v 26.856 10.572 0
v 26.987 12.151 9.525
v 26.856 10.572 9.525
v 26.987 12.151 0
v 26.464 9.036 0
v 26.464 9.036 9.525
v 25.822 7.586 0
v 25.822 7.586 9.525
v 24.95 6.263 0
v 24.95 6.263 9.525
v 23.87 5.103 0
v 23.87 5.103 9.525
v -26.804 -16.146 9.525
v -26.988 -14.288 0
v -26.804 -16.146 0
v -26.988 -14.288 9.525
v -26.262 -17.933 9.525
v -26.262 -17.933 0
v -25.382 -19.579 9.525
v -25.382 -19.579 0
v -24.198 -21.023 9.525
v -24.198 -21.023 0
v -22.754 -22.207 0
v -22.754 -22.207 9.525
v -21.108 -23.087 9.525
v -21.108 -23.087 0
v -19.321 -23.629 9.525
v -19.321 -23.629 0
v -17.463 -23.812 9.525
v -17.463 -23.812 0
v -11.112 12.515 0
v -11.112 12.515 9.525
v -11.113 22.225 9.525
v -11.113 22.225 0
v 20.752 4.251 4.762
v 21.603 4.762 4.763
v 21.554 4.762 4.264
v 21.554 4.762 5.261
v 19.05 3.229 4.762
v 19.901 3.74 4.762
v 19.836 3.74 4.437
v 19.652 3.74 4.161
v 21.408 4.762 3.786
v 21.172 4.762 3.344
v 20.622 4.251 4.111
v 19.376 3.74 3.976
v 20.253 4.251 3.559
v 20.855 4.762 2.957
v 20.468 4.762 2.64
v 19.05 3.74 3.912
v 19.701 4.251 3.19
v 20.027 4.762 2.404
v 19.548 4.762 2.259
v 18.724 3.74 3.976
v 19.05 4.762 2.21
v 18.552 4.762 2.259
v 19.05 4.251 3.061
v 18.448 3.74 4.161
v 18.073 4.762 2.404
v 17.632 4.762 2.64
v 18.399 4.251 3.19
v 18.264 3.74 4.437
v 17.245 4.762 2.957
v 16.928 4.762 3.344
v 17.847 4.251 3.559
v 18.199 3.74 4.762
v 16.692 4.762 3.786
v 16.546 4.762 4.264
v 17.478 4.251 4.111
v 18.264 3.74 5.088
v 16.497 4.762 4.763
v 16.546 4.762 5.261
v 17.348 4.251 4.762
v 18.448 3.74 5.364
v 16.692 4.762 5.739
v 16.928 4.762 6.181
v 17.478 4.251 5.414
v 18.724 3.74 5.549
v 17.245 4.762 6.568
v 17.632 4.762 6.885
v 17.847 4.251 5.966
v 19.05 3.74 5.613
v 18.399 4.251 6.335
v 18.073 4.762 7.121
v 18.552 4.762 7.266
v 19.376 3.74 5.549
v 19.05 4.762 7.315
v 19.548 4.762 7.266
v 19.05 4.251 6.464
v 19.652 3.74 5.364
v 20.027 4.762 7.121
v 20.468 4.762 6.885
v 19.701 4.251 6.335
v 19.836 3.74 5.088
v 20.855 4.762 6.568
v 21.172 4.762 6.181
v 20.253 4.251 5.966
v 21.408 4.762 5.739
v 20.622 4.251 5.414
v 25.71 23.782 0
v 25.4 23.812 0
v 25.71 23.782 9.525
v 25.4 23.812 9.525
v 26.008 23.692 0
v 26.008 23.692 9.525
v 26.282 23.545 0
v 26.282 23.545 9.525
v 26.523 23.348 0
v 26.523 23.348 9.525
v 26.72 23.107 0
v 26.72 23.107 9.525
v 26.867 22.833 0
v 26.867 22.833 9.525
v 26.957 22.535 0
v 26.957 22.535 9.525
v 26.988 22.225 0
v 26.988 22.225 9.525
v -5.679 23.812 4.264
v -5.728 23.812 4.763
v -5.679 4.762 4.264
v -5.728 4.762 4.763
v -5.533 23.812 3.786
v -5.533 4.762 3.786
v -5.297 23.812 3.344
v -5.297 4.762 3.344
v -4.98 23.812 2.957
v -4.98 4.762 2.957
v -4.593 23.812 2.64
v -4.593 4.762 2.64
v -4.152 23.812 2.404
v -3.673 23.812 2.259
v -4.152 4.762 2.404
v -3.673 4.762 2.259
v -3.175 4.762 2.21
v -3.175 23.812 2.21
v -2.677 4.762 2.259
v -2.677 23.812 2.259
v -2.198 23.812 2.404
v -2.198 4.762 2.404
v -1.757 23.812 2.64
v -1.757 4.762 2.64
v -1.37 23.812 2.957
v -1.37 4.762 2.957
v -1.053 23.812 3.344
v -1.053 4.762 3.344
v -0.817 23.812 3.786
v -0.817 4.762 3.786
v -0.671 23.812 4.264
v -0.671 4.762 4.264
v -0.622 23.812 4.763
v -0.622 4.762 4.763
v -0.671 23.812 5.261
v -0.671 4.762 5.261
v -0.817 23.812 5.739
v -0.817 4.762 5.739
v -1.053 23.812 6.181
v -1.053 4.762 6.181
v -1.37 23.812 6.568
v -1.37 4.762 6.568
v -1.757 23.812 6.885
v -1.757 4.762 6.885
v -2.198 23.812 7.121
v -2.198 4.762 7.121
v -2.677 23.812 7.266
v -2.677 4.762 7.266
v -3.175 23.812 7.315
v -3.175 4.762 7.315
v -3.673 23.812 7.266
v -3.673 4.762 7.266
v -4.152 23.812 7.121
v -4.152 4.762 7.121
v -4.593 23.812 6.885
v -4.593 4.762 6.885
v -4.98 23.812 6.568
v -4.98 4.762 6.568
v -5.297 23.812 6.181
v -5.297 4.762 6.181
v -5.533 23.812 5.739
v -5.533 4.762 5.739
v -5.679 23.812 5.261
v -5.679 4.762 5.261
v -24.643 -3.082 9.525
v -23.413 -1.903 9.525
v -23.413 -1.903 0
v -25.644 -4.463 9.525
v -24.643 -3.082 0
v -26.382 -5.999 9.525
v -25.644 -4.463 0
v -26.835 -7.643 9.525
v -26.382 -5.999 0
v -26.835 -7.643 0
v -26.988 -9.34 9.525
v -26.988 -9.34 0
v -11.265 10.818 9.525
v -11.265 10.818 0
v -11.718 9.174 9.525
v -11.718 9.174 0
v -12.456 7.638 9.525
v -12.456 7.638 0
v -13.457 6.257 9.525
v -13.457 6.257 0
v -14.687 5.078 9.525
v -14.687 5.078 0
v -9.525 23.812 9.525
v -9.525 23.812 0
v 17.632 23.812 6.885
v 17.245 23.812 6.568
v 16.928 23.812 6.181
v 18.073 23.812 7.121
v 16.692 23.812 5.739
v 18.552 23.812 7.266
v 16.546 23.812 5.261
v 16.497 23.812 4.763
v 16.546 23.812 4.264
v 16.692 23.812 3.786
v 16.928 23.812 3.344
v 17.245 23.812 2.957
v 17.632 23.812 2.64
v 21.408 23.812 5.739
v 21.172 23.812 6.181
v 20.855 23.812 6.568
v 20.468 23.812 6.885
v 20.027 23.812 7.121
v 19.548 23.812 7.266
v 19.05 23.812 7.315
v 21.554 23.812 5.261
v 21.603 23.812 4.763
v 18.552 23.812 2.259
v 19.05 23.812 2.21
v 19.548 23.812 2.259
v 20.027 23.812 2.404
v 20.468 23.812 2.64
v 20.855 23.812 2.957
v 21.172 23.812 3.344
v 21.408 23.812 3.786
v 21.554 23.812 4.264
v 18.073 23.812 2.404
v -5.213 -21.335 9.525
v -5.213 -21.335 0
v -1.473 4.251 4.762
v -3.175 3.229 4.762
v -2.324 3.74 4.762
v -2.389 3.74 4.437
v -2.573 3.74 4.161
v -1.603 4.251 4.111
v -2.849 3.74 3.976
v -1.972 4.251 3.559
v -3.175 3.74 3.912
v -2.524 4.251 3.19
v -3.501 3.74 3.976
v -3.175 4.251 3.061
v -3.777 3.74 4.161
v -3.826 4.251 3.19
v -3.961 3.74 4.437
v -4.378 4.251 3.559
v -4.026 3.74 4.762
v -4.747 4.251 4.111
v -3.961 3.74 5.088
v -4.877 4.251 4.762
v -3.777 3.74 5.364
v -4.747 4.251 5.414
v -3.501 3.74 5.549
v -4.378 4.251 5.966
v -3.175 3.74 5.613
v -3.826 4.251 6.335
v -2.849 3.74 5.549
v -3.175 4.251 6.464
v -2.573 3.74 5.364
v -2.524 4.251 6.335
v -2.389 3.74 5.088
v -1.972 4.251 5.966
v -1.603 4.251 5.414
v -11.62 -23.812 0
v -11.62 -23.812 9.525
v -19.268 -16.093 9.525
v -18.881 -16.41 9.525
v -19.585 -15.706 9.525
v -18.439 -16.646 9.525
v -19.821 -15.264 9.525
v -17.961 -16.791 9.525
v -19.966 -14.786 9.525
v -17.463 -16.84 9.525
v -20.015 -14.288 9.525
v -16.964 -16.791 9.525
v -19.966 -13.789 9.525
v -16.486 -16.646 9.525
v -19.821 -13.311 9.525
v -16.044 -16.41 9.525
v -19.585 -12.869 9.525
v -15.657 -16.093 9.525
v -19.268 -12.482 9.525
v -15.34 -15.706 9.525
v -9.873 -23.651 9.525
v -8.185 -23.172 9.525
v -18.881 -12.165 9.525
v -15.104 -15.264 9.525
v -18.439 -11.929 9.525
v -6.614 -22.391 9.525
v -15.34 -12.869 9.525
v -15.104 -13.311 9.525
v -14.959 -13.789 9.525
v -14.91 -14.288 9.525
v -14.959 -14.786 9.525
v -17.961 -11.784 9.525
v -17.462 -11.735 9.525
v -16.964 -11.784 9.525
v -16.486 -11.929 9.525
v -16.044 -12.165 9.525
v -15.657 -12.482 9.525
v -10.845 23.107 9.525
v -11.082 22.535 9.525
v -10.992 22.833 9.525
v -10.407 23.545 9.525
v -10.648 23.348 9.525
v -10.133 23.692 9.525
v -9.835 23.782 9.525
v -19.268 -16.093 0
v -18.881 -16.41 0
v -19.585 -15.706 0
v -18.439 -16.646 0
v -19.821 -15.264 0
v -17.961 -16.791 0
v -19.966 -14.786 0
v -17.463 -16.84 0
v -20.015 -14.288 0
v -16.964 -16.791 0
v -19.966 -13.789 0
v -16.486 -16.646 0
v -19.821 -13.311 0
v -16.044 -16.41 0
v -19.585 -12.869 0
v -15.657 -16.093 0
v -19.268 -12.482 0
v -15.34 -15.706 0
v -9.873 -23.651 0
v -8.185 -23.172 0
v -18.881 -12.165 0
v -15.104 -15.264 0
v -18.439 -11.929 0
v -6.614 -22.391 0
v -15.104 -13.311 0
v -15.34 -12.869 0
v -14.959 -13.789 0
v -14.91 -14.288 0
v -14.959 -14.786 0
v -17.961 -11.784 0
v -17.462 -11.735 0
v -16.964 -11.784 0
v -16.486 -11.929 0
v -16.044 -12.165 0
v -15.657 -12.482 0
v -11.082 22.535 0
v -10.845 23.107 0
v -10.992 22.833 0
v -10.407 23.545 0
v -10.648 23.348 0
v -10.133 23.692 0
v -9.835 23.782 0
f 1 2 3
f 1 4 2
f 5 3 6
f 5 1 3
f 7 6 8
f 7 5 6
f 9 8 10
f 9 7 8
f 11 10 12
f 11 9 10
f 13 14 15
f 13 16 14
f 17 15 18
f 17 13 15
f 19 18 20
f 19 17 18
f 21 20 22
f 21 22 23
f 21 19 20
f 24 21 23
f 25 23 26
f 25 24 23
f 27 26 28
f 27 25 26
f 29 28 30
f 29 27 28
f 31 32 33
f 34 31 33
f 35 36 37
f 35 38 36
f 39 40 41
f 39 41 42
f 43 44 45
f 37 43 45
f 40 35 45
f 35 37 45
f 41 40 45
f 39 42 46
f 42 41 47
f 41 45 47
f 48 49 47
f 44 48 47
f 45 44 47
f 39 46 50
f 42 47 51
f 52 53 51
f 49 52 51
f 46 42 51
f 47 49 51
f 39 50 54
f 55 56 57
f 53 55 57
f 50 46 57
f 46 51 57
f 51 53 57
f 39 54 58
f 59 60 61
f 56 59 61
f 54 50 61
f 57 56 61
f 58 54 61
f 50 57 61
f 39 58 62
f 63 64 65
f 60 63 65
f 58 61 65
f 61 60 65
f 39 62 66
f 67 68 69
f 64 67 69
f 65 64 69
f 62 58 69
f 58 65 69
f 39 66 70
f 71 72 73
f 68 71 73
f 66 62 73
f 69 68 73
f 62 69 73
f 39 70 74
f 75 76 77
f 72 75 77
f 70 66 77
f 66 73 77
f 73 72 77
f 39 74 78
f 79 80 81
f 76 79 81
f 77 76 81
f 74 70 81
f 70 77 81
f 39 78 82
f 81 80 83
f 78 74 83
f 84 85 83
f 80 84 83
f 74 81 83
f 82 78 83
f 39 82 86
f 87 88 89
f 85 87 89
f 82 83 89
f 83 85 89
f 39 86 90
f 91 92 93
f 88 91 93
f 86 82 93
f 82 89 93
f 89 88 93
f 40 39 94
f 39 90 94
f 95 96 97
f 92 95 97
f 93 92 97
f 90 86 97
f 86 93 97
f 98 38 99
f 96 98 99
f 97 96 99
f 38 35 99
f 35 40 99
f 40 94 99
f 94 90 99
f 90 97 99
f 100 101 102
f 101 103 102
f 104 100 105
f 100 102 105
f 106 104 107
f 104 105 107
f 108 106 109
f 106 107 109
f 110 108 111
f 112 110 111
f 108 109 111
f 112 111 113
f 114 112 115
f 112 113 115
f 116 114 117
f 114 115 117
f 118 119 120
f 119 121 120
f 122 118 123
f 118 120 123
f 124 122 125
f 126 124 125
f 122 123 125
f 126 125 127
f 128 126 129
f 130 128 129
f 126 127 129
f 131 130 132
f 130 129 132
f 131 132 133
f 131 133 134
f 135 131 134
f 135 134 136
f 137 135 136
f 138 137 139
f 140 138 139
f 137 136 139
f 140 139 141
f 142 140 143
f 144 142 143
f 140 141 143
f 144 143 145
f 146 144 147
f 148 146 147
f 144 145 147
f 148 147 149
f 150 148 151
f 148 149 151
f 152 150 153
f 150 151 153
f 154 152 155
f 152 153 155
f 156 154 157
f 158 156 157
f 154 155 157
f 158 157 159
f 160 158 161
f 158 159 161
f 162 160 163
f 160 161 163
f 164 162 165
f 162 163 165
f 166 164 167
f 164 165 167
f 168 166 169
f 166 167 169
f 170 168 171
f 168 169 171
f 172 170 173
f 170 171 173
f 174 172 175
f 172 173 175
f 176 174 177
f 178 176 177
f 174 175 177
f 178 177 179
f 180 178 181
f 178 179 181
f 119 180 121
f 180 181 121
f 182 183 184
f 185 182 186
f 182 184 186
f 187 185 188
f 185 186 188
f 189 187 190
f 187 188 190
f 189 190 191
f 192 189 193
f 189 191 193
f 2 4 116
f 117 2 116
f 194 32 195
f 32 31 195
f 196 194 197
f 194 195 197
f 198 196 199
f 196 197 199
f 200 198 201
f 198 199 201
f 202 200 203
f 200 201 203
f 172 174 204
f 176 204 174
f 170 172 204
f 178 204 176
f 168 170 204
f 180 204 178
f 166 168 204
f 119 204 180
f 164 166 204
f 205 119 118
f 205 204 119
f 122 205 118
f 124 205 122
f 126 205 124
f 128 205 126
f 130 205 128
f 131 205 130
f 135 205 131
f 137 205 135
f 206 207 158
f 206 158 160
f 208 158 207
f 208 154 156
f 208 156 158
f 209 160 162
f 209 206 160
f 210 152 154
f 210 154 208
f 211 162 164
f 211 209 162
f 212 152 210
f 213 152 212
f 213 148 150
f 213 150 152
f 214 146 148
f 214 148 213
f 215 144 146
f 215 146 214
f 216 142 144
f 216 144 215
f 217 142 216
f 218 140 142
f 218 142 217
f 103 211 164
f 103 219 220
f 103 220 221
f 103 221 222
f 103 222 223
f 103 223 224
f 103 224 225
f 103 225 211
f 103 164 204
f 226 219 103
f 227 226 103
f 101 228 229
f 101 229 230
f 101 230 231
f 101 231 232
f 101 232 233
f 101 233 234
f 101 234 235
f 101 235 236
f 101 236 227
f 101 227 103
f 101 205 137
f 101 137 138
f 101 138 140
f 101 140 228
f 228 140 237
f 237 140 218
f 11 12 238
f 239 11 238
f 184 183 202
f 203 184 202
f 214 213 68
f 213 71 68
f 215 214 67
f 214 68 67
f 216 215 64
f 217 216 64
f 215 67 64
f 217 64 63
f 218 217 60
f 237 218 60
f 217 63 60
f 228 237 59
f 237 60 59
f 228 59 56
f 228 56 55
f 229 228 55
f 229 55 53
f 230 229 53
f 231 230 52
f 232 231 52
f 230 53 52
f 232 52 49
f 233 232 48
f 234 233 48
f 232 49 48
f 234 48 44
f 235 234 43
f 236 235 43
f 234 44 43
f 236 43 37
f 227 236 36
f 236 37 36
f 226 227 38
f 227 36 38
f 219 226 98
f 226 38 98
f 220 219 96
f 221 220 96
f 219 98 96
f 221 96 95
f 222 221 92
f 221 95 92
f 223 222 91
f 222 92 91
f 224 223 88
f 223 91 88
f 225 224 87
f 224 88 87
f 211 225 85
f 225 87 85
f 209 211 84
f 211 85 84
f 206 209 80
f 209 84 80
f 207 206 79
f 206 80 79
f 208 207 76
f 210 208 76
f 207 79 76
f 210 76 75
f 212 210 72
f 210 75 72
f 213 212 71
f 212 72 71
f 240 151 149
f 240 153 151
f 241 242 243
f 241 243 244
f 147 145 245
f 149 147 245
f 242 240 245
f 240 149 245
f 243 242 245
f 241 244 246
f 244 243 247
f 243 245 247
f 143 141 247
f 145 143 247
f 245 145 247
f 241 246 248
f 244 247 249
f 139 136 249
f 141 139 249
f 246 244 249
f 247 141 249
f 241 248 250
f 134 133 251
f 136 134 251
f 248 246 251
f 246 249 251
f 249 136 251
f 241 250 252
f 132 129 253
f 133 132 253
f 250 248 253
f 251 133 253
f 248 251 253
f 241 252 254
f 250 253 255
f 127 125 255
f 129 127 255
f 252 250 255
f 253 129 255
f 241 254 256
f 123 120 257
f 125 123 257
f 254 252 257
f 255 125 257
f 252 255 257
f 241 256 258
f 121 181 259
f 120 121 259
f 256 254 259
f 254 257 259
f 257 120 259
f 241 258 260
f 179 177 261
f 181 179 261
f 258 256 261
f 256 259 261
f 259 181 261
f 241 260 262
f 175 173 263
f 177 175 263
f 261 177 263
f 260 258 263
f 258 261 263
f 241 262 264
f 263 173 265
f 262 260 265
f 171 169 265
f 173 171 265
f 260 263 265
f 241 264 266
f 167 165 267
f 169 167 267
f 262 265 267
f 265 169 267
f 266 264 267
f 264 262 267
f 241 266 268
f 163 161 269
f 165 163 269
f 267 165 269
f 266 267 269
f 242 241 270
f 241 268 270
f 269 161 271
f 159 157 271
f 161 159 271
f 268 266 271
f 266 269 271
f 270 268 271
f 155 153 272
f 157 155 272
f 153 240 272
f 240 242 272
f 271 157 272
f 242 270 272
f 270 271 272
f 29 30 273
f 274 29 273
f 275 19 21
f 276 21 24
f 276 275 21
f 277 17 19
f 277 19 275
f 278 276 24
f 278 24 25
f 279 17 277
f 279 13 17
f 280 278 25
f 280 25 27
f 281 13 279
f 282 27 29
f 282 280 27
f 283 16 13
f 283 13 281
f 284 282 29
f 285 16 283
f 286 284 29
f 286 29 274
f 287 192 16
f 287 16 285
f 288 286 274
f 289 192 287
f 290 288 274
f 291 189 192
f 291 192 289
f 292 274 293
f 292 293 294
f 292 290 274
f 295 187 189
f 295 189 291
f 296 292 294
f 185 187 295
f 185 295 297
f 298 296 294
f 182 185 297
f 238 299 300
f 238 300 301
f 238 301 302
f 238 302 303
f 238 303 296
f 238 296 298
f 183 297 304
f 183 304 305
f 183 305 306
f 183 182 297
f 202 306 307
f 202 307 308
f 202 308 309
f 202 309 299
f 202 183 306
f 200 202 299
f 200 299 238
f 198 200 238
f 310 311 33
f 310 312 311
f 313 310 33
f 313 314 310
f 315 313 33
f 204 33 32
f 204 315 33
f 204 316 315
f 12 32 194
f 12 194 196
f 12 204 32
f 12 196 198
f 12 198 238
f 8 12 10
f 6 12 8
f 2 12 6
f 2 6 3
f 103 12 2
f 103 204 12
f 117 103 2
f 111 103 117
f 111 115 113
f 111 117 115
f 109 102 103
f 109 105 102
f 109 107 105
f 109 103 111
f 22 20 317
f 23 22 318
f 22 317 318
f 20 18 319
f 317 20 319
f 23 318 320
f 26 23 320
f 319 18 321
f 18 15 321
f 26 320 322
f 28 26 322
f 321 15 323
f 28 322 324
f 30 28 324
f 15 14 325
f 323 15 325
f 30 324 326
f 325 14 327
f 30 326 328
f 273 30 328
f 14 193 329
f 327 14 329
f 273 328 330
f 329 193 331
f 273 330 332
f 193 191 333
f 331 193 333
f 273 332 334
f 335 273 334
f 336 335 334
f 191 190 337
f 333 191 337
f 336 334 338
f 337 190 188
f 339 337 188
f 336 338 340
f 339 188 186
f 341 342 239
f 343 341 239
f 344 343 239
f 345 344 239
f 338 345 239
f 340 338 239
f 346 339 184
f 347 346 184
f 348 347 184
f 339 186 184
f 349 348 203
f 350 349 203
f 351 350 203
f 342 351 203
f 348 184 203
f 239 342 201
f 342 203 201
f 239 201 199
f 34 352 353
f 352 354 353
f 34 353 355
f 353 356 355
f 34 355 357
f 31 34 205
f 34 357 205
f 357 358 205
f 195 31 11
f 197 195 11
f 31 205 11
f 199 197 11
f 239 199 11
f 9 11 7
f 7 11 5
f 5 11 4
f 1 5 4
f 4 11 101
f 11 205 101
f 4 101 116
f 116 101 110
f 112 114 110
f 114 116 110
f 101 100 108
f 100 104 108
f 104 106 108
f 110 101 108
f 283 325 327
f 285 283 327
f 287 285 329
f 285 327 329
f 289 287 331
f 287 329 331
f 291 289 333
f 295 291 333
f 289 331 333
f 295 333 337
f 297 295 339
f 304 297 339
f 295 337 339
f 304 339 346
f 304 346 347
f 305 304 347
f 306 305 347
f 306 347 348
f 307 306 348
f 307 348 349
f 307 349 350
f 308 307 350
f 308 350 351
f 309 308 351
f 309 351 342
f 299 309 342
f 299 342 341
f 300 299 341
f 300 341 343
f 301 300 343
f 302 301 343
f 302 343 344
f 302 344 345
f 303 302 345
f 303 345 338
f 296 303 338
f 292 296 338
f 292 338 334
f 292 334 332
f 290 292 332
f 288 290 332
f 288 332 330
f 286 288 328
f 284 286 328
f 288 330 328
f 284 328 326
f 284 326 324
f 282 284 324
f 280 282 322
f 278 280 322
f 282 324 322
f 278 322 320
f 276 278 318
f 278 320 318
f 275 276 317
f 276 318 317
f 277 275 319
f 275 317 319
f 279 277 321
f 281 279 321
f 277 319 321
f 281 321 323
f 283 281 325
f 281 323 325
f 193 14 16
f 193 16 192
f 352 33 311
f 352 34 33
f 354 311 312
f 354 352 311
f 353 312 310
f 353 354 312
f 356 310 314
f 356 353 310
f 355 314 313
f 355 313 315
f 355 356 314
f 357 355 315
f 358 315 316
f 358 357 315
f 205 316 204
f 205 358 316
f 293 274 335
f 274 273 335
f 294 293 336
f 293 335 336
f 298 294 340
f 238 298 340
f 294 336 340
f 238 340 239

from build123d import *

# Parameters (mm, degrees)
SKETCH1_W                   = 53.975
SKETCH1_H                   = 47.625
BASE_FLANGE1_DEPTH          = 9.525
F_1_4_20_TAPPED_HOLE1_D     = 5.1054
F_1_4_20_TAPPED_HOLE1_DEPTH = 19.05
F_1_4_20_TAPPED_HOLE1_TIP   = 1.533816902
CUT_EXTRUDE1_DEPTH          = 38.230175094
CUT_EXTRUDE2_REACH          = 39.23
F_1_4_20_TAPPED_HOLE2_D     = 5.1054
F_1_4_20_TAPPED_HOLE2_DEPTH = 9.525
CUT_EXTRUDE3_REACH          = 39.23
FILLET2_R                   = 1.5875
FILLET1_R                   = 9.525


# Sheet-metal steps are written as plain solids
with BuildPart() as part:
    # Sketch1 → Base-Flange1 (new body)
    with BuildSketch(Plane.XY):
        Rectangle(SKETCH1_W, SKETCH1_H)
    extrude(amount=BASE_FLANGE1_DEPTH)

    # 1/4-20 Tapped Hole1
    with Locations(Plane(origin=(0, 23.8125, 0), x_dir=(1, 0, 0), z_dir=(0, 1, 0))):
        with Locations((-3.175, -4.7625), (19.05, -4.7625)):
            Hole(F_1_4_20_TAPPED_HOLE1_D / 2, depth=F_1_4_20_TAPPED_HOLE1_DEPTH)
            with Locations((0, 0, -(F_1_4_20_TAPPED_HOLE1_DEPTH + F_1_4_20_TAPPED_HOLE1_TIP / 2))):  # 118° drill point
                Cone(0, F_1_4_20_TAPPED_HOLE1_D / 2, F_1_4_20_TAPPED_HOLE1_TIP, mode=Mode.SUBTRACT)

    # Sketch4 → Cut-Extrude1 (cut, through all)
    with BuildSketch(Plane(origin=(0, 0, 0), x_dir=(-1, 0, 0), z_dir=(0, 0, -1))):
        with BuildLine():
            Line((17.5895, -14.224), (17.5895, -14.351))
            ThreePointArc((17.5895, -14.351), (17.4625, -14.478), (17.3355, -14.351))
            Line((17.3355, -14.351), (17.3355, -14.224))
            ThreePointArc((17.3355, -14.224), (17.4625, -14.097), (17.5895, -14.224))
        make_face()
    extrude(amount=-CUT_EXTRUDE1_DEPTH, mode=Mode.SUBTRACT)

    # Sketch5 → Cut-Extrude2 (cut, up to next)
    with BuildSketch(Plane.XY.offset(9.525), mode=Mode.PRIVATE) as cut_extrude2_sk1:
        Polygon((26.9875, -23.8125), (26.9875, 7.9375), (-7.9375, -23.8125), align=None)
    cut_extrude2_tool1 = extrude(cut_extrude2_sk1.sketch, amount=-CUT_EXTRUDE2_REACH, mode=Mode.PRIVATE) & part.part
    add(cut_extrude2_tool1.solids().sort_by_distance((15.345833, -13.229167, 9.525))[0], mode=Mode.SUBTRACT)

    # 1/4-20 Tapped Hole2
    with Locations(Plane.XY.offset(9.525)):
        with Locations((-17.4625, -14.2875)):
            Hole(F_1_4_20_TAPPED_HOLE2_D / 2, depth=F_1_4_20_TAPPED_HOLE2_DEPTH)

    # Sketch8 → Cut-Extrude3 (cut, up to next)
    with BuildSketch(Plane.XY.offset(9.525), mode=Mode.PRIVATE) as cut_extrude3_sk1:
        Polygon((-26.9875, -4.7625), (-11.1125, 7.9375), (-11.1125, 23.8125), (-26.9875, 23.8125), align=None)
    cut_extrude3_tool1 = extrude(cut_extrude3_sk1.sketch, amount=-CUT_EXTRUDE3_REACH, mode=Mode.PRIVATE) & part.part
    add(cut_extrude3_tool1.solids().sort_by_distance((-19.805952, 12.397619, 9.525))[0], mode=Mode.SUBTRACT)

    # Fillet2
    fillet2_edges = [part.edges().sort_by_distance(p)[0] for p in [
        (-11.1125, 23.8125, 4.7625),
        (26.9875, 23.8125, 4.7625),
    ]]
    fillet(fillet2_edges, radius=FILLET2_R)

    # Fillet1
    fillet1_edges = [part.edges().sort_by_distance(p)[0] for p in [
        (-7.9375, -23.8125, 4.7625),
        (26.9875, 7.9375, 4.7625),
        (-11.1125, 7.9375, 4.7625),
        (-26.9875, -4.7625, 4.7625),
        (-26.9875, -23.8125, 4.7625),
    ]]
    fillet(fillet1_edges, radius=FILLET1_R)


solid = part.part
